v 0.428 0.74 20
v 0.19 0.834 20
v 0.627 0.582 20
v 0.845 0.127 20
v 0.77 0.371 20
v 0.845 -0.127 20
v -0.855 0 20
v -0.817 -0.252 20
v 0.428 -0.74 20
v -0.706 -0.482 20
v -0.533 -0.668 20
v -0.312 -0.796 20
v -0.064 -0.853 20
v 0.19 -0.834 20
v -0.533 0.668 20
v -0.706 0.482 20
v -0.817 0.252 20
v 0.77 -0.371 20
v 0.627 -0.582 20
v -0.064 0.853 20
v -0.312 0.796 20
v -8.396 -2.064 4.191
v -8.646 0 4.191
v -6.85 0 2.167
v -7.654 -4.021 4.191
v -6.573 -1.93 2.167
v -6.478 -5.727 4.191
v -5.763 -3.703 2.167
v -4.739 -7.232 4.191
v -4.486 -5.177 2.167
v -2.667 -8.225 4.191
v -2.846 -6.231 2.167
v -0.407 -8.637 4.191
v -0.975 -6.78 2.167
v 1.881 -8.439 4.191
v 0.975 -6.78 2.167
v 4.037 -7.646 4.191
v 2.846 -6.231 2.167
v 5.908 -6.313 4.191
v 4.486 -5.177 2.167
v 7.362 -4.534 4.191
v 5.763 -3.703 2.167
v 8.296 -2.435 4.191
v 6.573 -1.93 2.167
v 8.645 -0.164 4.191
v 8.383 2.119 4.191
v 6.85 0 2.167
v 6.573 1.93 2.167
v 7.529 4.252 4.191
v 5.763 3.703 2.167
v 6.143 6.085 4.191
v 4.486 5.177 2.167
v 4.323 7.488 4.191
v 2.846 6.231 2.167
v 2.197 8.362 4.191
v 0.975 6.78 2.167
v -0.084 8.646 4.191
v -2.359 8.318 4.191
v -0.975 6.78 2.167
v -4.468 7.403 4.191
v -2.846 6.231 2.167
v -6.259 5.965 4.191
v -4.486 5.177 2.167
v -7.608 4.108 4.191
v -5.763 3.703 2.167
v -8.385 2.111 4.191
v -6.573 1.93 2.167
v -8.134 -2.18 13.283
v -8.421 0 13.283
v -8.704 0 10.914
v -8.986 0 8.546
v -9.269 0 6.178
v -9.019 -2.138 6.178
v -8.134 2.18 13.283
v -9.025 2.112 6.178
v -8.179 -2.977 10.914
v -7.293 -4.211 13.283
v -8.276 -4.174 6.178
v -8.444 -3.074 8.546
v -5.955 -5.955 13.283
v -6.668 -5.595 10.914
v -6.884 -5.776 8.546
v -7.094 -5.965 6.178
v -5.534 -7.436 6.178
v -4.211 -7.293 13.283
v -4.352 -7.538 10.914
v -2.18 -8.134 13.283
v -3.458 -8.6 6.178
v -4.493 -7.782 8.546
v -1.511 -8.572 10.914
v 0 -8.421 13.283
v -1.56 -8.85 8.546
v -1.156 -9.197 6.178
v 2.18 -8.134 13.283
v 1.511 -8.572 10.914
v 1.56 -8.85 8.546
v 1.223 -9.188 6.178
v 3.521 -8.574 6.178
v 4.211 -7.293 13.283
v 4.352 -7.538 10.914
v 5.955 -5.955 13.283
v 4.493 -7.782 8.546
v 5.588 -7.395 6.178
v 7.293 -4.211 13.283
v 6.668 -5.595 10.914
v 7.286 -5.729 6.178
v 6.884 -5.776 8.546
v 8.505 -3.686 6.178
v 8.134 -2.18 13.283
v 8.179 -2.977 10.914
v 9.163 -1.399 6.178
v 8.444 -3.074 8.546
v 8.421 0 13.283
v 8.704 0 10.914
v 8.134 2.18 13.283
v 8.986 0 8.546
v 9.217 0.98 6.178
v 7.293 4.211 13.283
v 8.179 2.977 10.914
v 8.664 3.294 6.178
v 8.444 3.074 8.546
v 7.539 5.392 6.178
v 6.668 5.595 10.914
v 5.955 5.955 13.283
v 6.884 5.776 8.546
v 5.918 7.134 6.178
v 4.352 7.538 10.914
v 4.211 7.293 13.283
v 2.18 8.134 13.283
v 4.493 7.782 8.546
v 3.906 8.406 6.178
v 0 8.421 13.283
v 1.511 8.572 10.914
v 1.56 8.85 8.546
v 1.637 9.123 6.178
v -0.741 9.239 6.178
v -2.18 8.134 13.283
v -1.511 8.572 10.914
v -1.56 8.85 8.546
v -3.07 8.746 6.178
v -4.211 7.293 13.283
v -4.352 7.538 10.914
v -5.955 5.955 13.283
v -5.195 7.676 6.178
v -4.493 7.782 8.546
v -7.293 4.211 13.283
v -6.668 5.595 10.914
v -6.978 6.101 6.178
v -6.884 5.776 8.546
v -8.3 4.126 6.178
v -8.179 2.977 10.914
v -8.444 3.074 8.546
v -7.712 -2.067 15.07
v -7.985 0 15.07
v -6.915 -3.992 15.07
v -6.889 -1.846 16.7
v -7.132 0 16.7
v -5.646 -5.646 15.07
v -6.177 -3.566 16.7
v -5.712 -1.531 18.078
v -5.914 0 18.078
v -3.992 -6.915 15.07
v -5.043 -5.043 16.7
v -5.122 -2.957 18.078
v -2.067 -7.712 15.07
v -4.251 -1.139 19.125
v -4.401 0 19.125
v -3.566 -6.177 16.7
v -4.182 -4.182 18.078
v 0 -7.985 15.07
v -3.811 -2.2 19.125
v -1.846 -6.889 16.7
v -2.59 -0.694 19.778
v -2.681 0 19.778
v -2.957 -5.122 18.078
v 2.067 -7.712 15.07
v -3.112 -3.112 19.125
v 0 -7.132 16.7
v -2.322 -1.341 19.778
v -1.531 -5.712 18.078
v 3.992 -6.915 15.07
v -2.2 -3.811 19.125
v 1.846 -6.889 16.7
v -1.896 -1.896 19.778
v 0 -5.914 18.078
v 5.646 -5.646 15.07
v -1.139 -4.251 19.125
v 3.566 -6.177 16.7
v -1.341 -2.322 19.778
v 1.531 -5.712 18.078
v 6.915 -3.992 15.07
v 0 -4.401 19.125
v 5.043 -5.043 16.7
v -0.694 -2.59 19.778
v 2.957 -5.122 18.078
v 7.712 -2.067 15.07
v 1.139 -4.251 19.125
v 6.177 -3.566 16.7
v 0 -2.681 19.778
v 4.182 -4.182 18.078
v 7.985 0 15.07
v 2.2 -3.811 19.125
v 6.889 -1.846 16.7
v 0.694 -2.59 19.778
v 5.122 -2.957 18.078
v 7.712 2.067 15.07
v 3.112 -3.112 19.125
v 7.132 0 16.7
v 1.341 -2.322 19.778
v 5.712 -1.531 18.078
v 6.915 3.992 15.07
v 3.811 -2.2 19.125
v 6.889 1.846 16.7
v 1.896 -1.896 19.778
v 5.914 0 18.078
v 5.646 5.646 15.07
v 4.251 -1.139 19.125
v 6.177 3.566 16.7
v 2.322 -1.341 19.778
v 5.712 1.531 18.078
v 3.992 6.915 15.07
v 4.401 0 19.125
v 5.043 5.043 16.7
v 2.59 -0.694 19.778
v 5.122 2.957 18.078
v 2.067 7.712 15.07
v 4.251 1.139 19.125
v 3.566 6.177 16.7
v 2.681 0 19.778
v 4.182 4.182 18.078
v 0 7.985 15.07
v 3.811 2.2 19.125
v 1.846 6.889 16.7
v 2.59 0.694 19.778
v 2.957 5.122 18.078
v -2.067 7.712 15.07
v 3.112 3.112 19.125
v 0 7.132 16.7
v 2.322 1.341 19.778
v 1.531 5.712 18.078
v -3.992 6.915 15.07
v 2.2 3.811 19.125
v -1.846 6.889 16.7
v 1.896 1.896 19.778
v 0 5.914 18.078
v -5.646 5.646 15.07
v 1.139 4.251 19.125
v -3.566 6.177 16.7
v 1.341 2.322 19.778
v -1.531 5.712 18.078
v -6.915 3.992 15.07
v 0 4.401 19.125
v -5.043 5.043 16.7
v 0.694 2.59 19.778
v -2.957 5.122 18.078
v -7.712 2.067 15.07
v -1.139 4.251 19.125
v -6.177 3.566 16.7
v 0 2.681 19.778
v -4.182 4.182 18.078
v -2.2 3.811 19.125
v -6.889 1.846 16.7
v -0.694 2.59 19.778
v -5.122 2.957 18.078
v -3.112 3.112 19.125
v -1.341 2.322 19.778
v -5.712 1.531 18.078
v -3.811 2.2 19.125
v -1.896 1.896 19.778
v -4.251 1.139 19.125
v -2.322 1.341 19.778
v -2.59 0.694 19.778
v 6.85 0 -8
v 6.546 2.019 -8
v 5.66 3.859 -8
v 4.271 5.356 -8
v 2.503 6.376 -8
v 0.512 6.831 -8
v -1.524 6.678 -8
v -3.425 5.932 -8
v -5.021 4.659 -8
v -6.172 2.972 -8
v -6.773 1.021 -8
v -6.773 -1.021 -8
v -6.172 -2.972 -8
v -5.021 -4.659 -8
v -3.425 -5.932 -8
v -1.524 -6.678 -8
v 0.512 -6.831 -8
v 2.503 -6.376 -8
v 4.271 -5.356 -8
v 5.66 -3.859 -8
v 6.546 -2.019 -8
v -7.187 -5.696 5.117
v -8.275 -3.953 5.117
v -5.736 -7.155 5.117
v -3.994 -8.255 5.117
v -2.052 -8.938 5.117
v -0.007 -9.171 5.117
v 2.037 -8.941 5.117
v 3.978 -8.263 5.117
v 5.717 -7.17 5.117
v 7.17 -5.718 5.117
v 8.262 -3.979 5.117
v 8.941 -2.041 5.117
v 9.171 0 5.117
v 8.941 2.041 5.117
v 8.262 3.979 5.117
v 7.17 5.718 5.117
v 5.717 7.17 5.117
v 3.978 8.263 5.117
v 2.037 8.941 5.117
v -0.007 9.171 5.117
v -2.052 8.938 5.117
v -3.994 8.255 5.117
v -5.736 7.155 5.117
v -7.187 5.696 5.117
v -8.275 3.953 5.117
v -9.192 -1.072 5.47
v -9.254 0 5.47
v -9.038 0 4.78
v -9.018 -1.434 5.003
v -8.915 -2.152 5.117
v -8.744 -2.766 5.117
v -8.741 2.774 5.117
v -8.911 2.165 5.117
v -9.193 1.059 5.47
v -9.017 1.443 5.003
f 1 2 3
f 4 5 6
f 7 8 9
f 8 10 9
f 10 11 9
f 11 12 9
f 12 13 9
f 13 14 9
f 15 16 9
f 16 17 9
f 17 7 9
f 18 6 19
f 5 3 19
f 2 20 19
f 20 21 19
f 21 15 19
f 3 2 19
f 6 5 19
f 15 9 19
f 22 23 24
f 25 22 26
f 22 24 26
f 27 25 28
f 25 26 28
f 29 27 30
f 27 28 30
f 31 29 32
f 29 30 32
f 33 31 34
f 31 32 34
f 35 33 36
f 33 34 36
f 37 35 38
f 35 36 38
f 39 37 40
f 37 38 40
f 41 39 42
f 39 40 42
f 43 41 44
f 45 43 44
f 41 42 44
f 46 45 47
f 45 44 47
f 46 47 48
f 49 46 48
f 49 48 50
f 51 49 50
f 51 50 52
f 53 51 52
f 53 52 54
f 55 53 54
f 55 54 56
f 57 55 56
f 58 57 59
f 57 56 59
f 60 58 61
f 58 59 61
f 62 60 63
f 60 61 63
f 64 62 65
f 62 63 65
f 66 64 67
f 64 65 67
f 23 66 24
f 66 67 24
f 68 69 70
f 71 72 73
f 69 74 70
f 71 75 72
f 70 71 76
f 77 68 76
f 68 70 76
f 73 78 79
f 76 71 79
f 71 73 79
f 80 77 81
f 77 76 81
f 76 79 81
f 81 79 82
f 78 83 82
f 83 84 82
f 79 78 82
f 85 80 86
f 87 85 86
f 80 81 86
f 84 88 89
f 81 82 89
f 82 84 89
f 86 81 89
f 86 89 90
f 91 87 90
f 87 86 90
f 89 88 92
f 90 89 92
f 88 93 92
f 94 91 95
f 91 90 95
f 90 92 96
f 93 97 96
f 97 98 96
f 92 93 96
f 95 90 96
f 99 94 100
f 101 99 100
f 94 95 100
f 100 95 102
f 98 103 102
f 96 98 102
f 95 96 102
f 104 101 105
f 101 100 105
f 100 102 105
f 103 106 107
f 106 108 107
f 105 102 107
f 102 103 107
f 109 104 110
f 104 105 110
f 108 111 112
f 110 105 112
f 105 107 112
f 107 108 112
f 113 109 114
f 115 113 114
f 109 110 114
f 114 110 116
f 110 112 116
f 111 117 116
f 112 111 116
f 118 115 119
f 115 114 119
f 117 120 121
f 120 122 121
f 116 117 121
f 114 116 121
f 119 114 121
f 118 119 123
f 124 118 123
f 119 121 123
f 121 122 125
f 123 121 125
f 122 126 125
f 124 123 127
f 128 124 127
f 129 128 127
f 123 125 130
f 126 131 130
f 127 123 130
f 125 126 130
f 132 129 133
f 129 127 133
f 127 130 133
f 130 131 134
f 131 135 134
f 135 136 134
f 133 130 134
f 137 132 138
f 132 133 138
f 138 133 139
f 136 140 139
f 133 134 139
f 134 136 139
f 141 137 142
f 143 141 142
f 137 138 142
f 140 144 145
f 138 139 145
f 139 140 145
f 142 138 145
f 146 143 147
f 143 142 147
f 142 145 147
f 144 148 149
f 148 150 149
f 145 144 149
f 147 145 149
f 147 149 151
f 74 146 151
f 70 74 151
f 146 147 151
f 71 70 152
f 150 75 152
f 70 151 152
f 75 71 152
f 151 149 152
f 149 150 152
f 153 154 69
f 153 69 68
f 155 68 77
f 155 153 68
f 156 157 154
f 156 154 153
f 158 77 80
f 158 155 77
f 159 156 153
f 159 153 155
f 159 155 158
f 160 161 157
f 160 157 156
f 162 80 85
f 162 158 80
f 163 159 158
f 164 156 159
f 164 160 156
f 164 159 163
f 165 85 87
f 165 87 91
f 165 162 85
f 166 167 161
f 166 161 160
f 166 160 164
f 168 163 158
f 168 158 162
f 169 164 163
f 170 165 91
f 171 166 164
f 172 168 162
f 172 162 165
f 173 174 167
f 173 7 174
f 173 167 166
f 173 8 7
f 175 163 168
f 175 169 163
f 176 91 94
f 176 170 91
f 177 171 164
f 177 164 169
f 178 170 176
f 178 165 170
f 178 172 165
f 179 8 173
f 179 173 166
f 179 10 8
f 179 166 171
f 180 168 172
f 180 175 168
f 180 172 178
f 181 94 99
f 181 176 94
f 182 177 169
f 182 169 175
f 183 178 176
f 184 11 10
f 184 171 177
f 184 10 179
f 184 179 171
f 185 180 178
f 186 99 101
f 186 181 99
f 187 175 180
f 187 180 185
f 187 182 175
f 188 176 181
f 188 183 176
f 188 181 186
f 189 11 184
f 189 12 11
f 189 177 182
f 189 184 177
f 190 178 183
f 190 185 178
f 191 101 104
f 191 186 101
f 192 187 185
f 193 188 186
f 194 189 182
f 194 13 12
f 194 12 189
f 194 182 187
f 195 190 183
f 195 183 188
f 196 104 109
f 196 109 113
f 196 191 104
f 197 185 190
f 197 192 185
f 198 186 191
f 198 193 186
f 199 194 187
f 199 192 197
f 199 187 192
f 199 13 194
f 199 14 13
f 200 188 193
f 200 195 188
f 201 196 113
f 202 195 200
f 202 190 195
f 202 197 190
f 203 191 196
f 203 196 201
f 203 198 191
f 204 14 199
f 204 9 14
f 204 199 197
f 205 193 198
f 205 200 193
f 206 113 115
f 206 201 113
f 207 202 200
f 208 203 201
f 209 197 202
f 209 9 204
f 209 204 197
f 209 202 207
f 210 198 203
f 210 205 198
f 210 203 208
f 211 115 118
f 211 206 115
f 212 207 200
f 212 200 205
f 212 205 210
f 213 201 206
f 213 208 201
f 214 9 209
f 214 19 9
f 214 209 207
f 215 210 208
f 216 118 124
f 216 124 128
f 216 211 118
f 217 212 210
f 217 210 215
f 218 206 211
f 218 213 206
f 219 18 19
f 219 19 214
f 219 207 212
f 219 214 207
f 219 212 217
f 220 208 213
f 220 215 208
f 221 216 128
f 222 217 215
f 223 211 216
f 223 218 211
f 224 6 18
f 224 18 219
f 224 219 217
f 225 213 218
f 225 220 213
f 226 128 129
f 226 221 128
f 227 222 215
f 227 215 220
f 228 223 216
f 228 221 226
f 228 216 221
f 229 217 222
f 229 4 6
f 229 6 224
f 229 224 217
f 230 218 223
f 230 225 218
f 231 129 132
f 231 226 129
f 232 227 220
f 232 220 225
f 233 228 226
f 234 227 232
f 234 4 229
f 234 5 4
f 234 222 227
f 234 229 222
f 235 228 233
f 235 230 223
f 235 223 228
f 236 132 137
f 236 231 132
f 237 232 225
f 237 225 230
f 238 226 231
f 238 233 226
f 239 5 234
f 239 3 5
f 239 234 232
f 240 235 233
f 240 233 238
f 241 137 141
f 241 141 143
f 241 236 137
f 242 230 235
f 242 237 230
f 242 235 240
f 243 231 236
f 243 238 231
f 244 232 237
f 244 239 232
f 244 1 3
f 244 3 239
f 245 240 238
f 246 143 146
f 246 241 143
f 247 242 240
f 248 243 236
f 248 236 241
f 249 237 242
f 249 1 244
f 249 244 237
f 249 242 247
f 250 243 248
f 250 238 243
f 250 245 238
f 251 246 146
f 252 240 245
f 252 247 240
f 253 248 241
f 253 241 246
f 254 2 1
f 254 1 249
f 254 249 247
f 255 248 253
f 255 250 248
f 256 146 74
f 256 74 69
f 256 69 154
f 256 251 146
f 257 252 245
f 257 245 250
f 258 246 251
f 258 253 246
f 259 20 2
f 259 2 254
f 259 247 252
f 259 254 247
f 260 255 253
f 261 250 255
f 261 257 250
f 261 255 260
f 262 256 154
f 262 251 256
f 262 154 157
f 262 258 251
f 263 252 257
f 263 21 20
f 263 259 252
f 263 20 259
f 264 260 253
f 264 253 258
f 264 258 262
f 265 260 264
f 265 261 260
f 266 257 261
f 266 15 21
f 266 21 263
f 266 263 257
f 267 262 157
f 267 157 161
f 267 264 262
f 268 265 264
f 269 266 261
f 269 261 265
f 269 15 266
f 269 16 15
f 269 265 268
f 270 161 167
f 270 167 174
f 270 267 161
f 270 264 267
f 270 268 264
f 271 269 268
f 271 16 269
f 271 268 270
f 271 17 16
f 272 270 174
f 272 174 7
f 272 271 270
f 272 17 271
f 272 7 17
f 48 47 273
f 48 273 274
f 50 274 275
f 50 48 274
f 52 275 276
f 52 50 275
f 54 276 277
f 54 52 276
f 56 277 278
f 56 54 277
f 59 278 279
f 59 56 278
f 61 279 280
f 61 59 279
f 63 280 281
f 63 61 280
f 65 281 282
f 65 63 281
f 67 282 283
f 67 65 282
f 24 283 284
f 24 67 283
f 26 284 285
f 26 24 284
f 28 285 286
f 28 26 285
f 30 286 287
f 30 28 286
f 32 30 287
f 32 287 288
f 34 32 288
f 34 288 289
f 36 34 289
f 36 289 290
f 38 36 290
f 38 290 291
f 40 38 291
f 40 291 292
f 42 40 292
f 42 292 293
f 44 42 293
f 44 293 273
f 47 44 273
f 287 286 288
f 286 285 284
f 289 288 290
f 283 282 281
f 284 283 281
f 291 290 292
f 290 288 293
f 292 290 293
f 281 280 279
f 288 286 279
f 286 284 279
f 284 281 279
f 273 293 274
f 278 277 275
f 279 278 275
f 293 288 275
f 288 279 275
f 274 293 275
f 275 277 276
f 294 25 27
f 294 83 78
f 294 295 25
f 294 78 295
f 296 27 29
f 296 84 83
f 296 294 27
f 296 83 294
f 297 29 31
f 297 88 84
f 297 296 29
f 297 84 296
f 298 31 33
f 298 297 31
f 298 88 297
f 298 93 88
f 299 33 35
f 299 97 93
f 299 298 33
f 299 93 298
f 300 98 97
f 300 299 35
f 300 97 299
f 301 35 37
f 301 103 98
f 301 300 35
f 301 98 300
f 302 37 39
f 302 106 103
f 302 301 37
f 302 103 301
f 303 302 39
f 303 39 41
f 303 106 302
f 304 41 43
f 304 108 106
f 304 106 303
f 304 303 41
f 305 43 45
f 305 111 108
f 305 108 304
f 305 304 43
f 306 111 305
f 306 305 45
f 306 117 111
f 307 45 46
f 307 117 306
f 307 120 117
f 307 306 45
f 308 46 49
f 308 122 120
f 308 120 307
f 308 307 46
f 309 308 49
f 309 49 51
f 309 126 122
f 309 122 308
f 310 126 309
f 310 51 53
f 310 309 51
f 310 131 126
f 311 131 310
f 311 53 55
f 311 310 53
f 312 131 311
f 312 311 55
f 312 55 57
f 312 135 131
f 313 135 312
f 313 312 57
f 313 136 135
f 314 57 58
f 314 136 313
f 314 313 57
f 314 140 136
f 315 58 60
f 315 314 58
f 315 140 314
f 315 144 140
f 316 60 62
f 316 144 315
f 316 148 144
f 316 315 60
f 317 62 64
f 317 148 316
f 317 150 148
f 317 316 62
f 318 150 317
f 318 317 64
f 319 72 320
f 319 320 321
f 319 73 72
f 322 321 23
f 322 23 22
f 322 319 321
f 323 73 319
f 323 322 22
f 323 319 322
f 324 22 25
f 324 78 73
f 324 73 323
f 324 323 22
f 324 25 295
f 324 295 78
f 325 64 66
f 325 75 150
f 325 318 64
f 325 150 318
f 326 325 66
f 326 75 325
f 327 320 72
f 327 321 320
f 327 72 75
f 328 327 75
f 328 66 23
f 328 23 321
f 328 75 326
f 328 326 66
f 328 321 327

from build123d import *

# Parameters (mm, degrees)
F0_R        = 6.85
F1_DEPTH    = 8
F4_R        = 7.62
F5_S5_R     = 6.85
F5_T6_DEPTH = 16
F6_R        = 2.54


# Not quite as in the source:
# - a fillet or chamfer that OpenCascade refuses, or shapes differently, is made with other operations: its cross-section is extruded or revolved along the edge and cut away or added


with BuildPart() as f1:
    # F0 (on Top) → F1 (new body)
    with BuildSketch(Plane.XY):
        Circle(F0_R)
    extrude(amount=-F1_DEPTH)

    # F2 (on Front) → F3 (revolve)
    with BuildSketch(Plane.XZ):
        Polygon((-10.0059127435, 0), (0, 0), (0, 20), (-7.62, 20), align=None)
    revolve(axis=Axis((0, 0, 10), (0, 0, 1)))

    # F4
    f4_edges = [f1.edges().sort_by_distance(p)[0] for p in [
        (7.62, 0, 20),
    ]]
    fillet(f4_edges, radius=F4_R)

    # F5: chamfer of 5.08 on 1 edges, made by hand


with BuildPart() as f5_tool2:
    # F5_s3 → F5_t4 (revolve)
    with BuildSketch(Plane.XZ):
        Polygon((-9.4041577027, 5.0442334275), (-4.9259127435, 0), (-10.0059127435, 0), align=None)
    revolve(axis=Axis((0, 0, 0), (0, 0, 1)))

    # F5_s5 → F5_t6 (cut, symmetric)
    with BuildSketch(Plane.XY.offset(2.5)):
        Circle(F5_S5_R)
    extrude(amount=F5_T6_DEPTH, both=True, mode=Mode.SUBTRACT)


with BuildPart() as f1_1:
    add(f1.part)

    # F5_t1: cut F5_tool2
    add(f5_tool2.part, mode=Mode.SUBTRACT)

    # F6
    f6_edges = [f1_1.edges().sort_by_distance(p)[0] for p in [
        (9.404158, 0, 5.044233),
    ]]
    fillet(f6_edges, radius=F6_R)


solid = f1_1.part
